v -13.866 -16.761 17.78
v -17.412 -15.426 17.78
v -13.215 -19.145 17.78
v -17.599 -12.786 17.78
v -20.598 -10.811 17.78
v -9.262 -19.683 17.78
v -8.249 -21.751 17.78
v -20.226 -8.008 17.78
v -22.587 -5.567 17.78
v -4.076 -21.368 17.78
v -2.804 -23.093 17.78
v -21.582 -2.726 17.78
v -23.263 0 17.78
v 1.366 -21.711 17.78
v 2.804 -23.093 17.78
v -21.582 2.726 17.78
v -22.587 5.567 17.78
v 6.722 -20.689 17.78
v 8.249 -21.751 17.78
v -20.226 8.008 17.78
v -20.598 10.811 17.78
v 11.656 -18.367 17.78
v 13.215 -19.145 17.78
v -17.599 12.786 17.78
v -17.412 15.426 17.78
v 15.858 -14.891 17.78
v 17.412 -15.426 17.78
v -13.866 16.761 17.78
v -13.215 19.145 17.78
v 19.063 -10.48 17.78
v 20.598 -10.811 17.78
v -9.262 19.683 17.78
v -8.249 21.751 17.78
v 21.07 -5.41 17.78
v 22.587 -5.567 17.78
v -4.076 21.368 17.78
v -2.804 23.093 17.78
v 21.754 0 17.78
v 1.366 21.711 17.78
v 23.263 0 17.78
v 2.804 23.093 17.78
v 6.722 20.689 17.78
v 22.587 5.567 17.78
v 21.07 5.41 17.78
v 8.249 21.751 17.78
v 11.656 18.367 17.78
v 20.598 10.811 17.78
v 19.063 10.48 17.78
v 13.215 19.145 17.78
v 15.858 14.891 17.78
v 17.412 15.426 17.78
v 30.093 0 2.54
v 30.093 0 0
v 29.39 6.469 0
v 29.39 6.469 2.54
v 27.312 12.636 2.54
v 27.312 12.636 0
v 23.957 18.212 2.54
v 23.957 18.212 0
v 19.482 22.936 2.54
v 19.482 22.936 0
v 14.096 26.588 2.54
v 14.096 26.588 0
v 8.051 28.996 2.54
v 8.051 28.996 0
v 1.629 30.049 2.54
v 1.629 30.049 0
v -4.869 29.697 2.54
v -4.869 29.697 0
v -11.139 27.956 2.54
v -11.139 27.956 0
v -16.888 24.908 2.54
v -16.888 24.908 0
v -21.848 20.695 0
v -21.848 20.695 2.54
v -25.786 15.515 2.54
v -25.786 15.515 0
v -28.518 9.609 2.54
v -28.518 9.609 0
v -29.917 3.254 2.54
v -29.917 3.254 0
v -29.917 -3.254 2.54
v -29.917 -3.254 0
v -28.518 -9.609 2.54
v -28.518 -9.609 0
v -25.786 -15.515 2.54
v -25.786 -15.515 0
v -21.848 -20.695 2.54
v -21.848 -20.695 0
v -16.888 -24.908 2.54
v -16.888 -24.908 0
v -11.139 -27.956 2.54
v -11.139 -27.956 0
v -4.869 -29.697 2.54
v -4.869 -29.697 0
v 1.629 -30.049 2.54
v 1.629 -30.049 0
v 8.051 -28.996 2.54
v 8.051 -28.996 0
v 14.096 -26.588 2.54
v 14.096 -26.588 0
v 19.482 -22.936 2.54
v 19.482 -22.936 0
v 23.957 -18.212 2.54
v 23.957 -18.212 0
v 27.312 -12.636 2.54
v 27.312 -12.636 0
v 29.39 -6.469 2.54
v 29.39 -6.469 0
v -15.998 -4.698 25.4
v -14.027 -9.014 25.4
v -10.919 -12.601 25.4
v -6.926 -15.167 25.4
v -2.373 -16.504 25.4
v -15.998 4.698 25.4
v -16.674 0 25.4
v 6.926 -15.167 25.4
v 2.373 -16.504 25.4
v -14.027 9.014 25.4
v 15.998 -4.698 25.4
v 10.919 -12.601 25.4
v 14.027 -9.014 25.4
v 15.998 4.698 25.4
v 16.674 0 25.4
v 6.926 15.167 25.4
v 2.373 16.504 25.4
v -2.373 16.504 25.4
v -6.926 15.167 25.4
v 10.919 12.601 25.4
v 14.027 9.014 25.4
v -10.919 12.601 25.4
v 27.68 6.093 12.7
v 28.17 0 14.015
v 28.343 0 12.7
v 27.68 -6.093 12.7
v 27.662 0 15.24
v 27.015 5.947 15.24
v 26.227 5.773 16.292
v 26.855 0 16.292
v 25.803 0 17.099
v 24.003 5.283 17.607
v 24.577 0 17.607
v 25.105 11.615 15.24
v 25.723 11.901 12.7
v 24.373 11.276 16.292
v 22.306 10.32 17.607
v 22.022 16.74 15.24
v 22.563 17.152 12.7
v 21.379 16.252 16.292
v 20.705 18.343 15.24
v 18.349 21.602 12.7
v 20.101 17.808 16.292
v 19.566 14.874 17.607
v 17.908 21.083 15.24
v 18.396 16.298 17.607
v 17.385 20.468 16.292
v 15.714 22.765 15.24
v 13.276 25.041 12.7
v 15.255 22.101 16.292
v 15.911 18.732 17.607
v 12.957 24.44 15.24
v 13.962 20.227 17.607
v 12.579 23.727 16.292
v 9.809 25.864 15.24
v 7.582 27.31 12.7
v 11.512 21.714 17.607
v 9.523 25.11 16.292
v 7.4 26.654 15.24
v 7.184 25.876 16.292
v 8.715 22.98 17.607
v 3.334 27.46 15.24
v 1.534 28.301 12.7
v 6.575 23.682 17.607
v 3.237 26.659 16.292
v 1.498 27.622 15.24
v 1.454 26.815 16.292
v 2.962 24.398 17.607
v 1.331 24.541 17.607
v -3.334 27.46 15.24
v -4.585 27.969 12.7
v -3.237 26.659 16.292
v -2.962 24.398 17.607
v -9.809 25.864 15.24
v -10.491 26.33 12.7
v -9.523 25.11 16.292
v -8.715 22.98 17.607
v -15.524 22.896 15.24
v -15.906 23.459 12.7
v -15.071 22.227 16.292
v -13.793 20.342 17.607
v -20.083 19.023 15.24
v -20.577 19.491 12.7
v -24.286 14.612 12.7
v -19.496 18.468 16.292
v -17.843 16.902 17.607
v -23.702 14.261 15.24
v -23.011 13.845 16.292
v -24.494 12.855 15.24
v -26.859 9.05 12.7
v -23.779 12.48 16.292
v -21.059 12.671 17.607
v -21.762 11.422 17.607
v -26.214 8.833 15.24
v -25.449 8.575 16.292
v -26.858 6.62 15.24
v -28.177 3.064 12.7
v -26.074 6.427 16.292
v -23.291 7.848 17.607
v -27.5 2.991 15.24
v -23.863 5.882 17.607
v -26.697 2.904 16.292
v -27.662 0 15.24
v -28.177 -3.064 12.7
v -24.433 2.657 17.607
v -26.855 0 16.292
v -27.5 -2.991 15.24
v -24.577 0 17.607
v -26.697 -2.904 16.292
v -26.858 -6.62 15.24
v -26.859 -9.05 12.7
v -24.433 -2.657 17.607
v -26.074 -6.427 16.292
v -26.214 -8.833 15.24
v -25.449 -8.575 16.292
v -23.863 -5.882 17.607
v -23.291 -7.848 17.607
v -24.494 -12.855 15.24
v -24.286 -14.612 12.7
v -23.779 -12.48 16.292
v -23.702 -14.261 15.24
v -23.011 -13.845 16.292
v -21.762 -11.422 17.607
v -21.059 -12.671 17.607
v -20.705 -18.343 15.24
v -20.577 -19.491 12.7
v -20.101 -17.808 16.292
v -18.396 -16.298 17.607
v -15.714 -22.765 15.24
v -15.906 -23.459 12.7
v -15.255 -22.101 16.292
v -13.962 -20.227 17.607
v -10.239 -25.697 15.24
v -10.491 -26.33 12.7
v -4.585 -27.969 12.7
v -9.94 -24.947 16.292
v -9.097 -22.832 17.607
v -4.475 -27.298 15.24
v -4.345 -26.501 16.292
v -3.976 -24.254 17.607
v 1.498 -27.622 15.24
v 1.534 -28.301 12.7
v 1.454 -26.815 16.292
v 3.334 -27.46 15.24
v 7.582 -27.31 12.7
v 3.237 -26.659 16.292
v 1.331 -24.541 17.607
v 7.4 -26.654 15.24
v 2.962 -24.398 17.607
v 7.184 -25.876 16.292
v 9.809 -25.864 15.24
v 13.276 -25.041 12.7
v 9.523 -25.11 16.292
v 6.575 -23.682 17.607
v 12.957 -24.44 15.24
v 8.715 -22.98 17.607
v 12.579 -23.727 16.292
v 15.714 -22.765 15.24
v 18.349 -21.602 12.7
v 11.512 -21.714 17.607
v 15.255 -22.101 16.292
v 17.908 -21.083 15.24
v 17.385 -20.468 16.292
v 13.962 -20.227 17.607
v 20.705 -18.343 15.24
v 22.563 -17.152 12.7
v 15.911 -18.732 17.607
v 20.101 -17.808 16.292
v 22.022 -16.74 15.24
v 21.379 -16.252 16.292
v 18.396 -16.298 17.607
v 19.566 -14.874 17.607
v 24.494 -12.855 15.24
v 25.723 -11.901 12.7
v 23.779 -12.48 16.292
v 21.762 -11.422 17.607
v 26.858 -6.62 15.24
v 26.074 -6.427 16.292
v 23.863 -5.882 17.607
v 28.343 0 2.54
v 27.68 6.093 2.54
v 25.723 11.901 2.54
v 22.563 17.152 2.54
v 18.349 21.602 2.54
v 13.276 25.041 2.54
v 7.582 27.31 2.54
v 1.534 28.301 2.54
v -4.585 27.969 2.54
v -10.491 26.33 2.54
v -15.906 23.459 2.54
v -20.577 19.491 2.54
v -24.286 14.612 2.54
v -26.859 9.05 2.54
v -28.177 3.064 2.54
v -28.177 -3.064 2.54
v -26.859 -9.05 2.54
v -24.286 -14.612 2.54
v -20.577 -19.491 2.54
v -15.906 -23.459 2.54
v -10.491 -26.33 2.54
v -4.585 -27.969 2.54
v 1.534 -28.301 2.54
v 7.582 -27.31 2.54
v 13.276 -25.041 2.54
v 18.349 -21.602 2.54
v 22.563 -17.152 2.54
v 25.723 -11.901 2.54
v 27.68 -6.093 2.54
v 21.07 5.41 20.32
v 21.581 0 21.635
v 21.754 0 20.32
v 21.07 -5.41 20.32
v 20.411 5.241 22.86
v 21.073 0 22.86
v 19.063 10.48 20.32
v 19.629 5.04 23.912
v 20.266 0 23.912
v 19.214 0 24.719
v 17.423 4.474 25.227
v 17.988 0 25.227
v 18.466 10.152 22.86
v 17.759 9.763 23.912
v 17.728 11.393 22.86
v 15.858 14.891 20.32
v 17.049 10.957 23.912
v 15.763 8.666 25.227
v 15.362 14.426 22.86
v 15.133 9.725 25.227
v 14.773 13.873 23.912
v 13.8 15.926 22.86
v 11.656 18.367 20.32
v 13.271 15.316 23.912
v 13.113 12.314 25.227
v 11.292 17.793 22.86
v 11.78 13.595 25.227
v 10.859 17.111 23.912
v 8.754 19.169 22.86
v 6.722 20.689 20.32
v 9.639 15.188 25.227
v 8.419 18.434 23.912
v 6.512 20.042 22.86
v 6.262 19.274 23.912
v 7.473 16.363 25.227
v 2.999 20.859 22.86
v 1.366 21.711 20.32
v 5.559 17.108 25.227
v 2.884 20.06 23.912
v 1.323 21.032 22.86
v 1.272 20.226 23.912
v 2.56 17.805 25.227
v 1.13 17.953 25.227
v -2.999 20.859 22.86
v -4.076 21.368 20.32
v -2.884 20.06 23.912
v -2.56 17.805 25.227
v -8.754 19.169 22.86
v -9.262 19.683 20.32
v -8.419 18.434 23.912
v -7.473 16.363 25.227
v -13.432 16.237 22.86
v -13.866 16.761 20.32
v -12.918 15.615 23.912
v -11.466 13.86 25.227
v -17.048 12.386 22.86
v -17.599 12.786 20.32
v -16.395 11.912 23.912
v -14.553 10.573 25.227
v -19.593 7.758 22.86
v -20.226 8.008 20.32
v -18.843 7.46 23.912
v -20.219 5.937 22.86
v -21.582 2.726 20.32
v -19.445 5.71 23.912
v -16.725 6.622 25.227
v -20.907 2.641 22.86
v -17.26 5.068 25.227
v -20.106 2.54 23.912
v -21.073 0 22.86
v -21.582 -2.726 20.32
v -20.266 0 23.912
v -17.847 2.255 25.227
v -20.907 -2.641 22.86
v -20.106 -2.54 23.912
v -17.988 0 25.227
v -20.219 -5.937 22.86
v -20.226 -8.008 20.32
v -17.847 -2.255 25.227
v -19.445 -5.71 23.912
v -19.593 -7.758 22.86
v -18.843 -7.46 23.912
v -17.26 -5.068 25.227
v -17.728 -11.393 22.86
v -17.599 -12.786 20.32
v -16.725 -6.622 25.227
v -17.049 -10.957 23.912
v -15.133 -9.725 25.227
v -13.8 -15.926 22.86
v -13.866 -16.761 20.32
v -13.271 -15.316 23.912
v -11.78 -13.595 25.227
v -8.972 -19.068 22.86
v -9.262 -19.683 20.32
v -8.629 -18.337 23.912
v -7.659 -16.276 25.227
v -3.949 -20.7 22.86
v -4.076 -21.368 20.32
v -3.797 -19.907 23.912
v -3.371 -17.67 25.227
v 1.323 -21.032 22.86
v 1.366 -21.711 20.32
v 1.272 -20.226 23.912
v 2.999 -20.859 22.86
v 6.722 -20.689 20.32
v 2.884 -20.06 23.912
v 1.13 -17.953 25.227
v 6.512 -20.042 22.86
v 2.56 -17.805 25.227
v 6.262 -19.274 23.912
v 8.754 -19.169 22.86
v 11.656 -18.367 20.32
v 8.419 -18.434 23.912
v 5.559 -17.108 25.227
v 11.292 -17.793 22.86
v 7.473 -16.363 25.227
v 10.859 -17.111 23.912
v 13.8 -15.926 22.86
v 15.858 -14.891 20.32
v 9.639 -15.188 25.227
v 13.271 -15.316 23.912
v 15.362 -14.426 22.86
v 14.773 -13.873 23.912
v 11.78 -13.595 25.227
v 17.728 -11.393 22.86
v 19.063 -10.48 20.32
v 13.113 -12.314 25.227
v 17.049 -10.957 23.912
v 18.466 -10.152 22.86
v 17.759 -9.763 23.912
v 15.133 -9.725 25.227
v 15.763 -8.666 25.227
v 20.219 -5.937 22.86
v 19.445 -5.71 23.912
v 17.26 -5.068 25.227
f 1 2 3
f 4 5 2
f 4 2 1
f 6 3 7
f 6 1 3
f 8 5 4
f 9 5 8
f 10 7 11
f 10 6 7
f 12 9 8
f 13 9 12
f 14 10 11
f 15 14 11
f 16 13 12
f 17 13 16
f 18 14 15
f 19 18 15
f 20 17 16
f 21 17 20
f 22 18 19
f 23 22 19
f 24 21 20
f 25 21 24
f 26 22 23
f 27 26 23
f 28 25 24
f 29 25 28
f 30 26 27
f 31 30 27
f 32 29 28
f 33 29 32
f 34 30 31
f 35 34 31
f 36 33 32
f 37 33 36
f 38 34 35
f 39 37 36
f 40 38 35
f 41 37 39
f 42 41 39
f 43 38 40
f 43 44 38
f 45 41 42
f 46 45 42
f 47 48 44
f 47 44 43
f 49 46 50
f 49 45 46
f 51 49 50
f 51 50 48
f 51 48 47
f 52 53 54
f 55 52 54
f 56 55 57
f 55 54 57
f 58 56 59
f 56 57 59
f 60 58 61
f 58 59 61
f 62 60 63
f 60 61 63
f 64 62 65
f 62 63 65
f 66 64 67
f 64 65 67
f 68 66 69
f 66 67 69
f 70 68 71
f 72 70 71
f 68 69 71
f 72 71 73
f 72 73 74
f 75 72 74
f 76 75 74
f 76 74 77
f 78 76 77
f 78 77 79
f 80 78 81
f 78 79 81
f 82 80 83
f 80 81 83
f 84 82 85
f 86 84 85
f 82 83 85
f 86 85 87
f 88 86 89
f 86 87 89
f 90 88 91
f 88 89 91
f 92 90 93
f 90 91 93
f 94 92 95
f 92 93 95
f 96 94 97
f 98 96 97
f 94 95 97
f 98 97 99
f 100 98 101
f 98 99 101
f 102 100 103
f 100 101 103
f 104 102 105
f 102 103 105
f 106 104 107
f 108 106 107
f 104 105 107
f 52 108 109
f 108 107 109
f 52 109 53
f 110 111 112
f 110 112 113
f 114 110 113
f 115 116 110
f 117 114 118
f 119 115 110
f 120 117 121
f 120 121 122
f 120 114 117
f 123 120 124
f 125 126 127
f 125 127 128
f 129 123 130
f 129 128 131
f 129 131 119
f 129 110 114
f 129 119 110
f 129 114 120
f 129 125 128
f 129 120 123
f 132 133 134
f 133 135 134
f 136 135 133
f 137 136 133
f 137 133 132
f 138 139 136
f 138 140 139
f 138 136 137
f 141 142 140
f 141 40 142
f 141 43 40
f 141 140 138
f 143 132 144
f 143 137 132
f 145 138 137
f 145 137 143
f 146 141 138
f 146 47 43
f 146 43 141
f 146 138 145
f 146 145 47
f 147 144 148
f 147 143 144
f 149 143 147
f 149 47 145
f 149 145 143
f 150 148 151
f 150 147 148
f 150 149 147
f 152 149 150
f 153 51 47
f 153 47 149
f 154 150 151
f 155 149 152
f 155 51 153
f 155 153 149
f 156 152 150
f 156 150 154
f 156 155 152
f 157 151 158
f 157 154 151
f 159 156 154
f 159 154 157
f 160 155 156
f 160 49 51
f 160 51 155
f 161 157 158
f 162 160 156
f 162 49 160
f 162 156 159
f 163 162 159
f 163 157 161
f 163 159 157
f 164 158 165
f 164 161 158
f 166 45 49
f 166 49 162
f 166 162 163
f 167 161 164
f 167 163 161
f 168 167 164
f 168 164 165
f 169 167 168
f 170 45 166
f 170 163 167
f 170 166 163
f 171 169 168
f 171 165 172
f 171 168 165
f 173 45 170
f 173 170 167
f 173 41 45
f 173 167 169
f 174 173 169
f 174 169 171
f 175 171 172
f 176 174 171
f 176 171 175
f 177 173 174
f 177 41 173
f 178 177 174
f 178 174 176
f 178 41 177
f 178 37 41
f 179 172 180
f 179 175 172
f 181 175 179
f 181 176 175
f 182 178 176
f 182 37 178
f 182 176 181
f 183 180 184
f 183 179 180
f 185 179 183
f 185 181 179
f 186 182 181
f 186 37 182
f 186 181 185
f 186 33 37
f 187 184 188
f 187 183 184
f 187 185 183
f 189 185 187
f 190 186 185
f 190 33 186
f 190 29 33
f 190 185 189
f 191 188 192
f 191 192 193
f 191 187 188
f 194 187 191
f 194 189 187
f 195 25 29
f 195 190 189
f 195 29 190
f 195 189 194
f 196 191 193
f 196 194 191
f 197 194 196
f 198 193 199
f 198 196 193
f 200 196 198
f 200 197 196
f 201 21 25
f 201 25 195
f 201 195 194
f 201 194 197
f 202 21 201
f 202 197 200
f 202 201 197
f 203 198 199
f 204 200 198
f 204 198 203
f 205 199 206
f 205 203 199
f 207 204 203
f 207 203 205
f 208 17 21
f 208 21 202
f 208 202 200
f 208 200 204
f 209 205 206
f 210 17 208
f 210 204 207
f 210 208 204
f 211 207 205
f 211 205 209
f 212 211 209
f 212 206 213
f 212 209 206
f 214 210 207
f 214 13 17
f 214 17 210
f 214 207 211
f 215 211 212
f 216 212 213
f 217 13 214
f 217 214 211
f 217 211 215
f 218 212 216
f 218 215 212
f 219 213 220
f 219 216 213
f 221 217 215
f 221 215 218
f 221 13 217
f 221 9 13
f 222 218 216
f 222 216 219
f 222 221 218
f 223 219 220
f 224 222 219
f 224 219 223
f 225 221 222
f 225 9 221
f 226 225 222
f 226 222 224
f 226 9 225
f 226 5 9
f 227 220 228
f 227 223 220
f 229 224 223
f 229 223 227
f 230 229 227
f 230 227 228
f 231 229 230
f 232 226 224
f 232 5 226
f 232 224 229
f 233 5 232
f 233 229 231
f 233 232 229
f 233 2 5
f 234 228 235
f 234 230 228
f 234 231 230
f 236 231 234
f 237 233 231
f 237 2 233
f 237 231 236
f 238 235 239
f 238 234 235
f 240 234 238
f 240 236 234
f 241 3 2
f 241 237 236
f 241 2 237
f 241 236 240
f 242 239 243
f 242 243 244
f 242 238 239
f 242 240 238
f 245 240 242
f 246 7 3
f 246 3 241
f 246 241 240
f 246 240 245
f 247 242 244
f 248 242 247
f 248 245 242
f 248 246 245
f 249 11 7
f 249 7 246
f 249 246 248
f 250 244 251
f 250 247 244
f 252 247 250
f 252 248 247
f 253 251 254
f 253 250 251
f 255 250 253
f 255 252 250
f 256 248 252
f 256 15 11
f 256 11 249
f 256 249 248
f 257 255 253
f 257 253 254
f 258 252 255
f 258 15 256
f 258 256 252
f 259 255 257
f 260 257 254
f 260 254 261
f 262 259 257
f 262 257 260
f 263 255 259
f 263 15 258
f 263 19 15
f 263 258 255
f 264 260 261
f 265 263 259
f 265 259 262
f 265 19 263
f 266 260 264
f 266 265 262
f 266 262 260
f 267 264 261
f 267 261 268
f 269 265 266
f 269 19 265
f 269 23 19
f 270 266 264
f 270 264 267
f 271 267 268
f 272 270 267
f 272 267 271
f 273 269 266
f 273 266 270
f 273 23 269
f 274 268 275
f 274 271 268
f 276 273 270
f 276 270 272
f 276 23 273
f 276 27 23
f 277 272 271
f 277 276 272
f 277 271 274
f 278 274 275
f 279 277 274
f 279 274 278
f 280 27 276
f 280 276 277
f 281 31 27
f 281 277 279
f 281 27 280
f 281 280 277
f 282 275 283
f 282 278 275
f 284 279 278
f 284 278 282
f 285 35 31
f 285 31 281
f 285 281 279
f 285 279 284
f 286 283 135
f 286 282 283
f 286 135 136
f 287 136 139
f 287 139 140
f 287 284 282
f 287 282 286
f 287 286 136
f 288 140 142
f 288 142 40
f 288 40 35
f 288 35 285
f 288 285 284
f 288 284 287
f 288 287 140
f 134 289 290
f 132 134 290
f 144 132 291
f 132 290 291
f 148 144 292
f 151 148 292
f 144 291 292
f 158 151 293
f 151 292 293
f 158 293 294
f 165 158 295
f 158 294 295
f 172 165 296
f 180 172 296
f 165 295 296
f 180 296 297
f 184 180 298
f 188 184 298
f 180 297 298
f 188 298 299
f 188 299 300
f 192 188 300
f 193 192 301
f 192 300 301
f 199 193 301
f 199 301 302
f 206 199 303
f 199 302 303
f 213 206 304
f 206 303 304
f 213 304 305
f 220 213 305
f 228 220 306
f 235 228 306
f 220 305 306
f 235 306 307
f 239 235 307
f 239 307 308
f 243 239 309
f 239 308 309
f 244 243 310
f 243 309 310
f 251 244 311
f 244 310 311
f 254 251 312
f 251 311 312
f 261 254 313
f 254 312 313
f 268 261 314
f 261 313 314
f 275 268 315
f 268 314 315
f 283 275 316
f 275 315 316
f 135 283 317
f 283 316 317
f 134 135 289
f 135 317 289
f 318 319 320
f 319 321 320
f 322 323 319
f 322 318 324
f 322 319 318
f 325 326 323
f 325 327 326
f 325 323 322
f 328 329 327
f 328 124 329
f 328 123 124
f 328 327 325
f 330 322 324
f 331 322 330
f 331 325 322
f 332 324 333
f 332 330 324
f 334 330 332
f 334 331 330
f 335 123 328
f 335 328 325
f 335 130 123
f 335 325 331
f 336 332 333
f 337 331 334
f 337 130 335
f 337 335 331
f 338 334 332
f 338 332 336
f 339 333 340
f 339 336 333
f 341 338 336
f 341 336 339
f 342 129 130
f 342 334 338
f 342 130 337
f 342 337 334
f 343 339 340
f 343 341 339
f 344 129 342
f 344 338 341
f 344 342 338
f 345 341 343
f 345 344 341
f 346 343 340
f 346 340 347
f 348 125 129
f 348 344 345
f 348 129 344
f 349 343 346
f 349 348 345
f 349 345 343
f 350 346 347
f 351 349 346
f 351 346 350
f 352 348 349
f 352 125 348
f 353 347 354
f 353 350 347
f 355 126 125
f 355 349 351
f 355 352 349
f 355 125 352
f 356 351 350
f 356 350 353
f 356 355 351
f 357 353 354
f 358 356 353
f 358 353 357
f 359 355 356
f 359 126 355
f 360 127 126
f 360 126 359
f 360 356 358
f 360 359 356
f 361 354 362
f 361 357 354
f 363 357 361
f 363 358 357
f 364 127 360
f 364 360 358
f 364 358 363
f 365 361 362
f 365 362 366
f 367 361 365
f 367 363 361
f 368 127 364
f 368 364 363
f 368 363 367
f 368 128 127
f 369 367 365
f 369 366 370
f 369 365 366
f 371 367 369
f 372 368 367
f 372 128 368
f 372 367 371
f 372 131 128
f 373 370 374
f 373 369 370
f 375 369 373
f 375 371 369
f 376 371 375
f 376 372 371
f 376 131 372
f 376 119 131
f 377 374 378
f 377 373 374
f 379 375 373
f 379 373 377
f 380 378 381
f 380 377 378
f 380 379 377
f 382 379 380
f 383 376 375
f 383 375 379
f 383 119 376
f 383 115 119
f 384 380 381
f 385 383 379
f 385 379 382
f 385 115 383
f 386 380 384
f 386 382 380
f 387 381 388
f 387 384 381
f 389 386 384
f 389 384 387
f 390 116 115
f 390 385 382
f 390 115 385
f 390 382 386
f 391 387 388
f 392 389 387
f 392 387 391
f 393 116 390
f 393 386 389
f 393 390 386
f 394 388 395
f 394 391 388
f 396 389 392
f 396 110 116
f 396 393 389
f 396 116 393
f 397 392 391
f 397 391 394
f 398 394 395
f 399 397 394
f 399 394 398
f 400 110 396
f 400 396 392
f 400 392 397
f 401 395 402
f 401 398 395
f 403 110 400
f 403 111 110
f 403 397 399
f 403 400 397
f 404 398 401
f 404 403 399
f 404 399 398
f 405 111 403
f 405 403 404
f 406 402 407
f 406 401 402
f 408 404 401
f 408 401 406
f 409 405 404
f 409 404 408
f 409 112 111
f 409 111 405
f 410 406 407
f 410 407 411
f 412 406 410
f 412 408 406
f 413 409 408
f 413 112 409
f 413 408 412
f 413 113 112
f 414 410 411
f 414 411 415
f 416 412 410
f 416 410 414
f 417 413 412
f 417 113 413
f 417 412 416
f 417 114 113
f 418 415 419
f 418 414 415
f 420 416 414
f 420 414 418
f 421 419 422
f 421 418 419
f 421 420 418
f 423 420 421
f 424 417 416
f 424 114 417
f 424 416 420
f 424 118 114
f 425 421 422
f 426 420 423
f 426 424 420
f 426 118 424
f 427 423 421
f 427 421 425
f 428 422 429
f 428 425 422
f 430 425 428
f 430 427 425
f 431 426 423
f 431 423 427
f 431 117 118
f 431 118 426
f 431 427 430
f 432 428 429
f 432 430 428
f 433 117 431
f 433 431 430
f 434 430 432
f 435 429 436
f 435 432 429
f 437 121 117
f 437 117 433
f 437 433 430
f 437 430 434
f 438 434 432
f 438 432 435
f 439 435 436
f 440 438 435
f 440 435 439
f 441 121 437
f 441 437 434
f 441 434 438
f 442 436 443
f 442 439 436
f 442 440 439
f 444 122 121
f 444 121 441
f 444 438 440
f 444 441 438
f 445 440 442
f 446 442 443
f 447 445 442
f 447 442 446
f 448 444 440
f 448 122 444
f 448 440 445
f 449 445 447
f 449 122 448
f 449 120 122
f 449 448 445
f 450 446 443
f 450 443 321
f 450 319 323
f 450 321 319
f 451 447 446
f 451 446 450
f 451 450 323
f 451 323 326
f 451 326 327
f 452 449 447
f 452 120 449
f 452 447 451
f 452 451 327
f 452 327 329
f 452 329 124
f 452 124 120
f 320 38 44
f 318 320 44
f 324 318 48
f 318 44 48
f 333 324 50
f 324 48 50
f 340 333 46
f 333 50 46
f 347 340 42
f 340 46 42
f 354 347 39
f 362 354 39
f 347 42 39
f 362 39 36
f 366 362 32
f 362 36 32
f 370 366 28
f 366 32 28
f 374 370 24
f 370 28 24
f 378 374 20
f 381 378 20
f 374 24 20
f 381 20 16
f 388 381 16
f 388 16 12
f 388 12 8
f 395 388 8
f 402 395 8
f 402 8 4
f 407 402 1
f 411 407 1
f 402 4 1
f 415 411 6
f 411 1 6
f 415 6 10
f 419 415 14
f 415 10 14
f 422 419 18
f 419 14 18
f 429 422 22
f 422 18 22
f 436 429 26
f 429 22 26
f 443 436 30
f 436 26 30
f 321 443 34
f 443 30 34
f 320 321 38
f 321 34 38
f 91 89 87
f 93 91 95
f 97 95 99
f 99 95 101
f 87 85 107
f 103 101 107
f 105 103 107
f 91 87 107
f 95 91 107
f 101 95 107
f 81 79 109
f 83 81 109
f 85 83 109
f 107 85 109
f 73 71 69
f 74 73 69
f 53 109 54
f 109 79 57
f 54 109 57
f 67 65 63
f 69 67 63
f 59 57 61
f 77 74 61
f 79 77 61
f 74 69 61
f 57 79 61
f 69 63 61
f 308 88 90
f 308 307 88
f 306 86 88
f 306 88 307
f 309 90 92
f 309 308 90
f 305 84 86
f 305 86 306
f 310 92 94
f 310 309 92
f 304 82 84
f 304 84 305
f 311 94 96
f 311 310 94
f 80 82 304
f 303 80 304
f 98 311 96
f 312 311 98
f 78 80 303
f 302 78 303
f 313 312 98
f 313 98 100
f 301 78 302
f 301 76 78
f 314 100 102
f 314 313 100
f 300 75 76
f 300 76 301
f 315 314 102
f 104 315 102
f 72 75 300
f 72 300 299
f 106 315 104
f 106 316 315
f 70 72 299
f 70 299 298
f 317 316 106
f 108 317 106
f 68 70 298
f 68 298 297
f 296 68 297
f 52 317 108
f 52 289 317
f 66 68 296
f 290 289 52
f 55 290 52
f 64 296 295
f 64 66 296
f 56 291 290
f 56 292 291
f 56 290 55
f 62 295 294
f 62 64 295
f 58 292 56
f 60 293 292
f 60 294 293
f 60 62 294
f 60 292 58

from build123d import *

# Parameters (mm, degrees)
F0_R     = 30.093252
F1_DEPTH = 2.54
F2_R     = 28.342661
F3_DEPTH = 15.24
F4_R     = 5.08
F5_R     = 21.753679
F6_DEPTH = 7.62
F7_R     = 5.08


with BuildPart() as f1:
    # F0 (on Top) → F1 (new body)
    with BuildSketch(Plane.XY):
        Circle(F0_R)
    extrude(amount=F1_DEPTH)

    # F2 (on face) → F3 (join)
    with BuildSketch(Plane.XY.offset(2.54)):
        Circle(F2_R)
    extrude(amount=F3_DEPTH)

    # F4
    f4_edges = [f1.edges().sort_by_distance(p)[0] for p in [
        (-28.342661, 0, 17.78),
    ]]
    fillet(f4_edges, radius=F4_R)

    # F5 (on face) → F6 (join)
    with BuildSketch(Plane.XY.offset(17.78)):
        Circle(F5_R)
    extrude(amount=F6_DEPTH)

    # F7
    f7_edges = [f1.edges().sort_by_distance(p)[0] for p in [
        (-21.753679, 0, 25.4),
    ]]
    fillet(f7_edges, radius=F7_R)


solid = f1.part
